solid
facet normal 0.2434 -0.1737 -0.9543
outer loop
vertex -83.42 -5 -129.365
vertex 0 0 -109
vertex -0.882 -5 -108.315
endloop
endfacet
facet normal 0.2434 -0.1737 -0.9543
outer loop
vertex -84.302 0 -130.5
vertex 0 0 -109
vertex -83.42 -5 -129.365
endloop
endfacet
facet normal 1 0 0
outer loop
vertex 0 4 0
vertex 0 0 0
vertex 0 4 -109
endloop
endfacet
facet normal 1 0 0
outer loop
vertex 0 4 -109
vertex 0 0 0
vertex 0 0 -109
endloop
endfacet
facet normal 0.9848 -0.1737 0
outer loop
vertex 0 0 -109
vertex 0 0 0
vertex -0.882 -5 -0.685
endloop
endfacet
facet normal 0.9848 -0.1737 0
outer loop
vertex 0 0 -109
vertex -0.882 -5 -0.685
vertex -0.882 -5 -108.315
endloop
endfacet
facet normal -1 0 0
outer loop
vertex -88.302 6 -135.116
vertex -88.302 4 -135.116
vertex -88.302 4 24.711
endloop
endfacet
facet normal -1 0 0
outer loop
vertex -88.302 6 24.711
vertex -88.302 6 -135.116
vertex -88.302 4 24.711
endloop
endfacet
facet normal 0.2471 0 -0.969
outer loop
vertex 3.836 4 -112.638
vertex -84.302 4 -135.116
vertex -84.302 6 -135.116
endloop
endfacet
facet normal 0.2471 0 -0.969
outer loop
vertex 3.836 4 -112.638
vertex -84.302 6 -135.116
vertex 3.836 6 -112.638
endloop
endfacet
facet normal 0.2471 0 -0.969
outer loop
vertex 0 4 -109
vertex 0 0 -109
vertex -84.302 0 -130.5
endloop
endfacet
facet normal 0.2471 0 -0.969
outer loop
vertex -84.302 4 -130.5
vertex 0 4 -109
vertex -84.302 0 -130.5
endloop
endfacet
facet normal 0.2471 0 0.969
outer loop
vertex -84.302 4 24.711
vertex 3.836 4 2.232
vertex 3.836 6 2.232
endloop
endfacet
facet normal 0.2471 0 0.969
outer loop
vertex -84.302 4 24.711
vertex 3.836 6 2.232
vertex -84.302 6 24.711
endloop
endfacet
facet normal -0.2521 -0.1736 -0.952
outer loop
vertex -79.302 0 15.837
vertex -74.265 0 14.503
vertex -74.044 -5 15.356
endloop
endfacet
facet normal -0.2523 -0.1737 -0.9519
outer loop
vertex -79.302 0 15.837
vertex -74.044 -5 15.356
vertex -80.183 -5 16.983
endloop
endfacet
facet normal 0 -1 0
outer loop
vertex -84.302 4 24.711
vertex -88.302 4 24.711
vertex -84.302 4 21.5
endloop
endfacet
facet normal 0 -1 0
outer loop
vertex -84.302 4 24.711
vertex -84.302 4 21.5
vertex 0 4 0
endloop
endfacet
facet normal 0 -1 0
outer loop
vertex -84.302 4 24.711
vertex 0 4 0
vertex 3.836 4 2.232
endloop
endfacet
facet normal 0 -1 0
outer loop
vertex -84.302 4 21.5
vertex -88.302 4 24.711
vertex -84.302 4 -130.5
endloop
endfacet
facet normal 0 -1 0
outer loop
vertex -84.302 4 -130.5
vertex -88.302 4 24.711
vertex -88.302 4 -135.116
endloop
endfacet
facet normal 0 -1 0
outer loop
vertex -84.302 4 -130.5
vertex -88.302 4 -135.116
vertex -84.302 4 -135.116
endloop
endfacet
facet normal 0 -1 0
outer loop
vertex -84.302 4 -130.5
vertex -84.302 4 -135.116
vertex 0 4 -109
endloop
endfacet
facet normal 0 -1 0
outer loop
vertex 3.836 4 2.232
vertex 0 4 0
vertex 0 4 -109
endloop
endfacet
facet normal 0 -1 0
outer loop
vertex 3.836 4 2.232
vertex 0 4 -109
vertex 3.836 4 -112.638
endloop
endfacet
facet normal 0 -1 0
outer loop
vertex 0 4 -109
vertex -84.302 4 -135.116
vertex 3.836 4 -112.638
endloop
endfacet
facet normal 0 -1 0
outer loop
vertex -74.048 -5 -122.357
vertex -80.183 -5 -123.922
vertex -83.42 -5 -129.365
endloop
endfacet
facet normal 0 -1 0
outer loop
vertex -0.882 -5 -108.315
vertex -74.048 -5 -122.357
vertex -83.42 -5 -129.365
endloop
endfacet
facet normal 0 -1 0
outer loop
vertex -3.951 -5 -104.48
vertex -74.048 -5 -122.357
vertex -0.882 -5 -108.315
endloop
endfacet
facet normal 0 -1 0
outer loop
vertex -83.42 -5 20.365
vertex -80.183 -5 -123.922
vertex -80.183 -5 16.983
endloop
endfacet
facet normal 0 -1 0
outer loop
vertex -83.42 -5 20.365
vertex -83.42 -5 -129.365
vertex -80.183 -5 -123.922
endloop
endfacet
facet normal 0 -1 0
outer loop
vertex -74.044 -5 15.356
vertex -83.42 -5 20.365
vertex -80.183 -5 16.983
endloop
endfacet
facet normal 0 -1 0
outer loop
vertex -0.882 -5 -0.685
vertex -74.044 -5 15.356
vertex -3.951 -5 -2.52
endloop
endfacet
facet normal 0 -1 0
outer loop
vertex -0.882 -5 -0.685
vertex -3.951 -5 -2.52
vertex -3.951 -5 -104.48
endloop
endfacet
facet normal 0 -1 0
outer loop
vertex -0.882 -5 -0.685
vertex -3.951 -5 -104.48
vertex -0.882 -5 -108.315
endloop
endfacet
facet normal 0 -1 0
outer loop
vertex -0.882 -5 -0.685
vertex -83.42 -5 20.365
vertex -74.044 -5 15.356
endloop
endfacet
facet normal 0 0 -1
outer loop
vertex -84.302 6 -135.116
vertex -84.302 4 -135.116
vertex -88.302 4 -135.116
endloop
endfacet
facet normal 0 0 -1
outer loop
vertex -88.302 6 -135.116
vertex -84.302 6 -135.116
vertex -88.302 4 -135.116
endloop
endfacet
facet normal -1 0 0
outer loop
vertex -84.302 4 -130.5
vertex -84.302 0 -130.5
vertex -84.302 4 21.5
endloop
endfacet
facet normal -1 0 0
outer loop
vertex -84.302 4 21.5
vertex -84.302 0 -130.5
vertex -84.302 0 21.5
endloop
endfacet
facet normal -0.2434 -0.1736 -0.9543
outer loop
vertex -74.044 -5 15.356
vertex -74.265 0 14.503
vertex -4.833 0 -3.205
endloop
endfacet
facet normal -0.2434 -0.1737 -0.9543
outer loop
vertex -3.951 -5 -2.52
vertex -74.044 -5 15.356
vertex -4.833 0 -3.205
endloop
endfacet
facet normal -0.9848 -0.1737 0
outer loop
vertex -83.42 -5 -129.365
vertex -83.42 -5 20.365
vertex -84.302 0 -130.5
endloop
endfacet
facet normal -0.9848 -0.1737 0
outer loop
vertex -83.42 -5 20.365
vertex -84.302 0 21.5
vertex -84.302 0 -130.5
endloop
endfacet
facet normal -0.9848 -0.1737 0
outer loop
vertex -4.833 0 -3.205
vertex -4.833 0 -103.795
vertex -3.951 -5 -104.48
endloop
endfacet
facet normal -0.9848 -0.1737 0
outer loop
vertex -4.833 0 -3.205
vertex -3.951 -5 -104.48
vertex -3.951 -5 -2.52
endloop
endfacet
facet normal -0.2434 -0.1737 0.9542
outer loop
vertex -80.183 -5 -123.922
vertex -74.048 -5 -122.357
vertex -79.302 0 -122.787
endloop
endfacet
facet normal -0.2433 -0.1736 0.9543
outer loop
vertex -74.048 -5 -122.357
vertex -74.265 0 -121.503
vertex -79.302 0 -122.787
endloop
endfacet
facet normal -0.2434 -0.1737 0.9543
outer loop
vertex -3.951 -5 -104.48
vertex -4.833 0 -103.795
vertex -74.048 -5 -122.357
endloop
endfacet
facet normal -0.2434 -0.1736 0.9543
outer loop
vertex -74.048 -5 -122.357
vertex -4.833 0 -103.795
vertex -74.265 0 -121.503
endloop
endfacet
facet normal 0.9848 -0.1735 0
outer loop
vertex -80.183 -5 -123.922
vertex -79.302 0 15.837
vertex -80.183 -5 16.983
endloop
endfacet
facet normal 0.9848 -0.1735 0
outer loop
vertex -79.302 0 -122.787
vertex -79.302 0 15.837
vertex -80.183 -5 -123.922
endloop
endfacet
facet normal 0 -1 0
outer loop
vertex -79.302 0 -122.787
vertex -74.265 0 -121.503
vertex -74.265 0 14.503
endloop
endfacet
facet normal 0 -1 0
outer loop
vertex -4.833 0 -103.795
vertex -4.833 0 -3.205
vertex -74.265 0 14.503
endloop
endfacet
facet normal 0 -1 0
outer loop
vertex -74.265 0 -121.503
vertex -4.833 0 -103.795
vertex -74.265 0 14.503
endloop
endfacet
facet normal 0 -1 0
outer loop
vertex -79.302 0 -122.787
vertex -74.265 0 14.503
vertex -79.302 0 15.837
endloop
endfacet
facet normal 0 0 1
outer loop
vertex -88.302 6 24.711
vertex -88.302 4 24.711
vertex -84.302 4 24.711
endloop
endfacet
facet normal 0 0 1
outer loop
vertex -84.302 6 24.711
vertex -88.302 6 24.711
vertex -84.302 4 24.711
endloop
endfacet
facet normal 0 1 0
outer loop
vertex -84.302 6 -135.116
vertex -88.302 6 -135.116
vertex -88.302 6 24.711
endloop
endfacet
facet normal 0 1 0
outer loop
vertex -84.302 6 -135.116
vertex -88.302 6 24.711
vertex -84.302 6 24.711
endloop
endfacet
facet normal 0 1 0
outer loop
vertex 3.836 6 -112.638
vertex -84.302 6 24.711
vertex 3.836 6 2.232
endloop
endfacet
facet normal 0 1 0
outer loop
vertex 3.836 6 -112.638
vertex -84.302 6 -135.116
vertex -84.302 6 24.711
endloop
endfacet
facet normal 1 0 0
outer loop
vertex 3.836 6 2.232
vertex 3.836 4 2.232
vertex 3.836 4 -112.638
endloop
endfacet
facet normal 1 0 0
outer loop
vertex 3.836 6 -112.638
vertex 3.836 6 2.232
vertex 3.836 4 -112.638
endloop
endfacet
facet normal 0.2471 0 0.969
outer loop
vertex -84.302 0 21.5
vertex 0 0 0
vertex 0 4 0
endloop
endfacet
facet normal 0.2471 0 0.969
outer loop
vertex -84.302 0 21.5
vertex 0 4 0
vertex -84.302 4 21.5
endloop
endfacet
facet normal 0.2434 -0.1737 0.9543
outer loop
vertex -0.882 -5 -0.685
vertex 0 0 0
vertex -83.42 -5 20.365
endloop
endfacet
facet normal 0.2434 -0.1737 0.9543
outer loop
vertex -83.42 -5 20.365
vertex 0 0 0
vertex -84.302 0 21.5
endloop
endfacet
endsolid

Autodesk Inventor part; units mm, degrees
ref_plane "YZ Plane" through (0, 0, 0) normal (1, 0, 0) x (0, 1, 0)
ref_plane "XZ Plane" through (0, 0, 0) normal (0, 1, 0) x (-1, 0, 0)
ref_plane "XY Plane" through (0, 0, 0) normal (0, 0, 1) x (1, 0, 0)
sketch "Sketch1" plane through (0, 0, 0) normal (0, 1, 0) x (-1, 0, 0)
  line L0 (0, 0) -> (0, -109)
  line L1 (0, -109) -> (84.3015, -130.5)
  line L2 (84.3015, -130.5) -> (84.3015, 21.5)
  line L3 (0, 0) -> (84.3015, 21.5)
  dimension "d0" = 109
  dimension "d3" = 87
  dimension "d4" = 152
  dimension "d5" = 87
extrude "Extrusion1" add sketch "Sketch1" along normal blind 4
sketch "Sketch2" plane through (0, 0, 0) normal (0, -1, 0) x (1, 0, 0)
  line L0 (0, 0) -> (0, -109) projected
  line L1 (0, -109) -> (-5, -109)
  line L2 (-4.8329, -103.795) -> (-4.8329, -3.205)
  line L3 (-5, 0) -> (0, 0)
  line L4 (0, 0) -> (0, -109)
  line L5 (0, -109) -> (-84.3015, -130.5) projected
  line L6 (-84.3015, -130.5) -> (-74.4446, -130.5)
  line L7 (-79.3015, 21.5) -> (-84.3015, 21.5)
  line L8 (-84.3015, 21.5) -> (-84.3015, -130.5)
  line L9 (-84.3015, -130.5) -> (0, -109)
  line L10 (0, -109) -> (-1.2356, -104.1551)
  line L11 (-85.5402, -125.6434) -> (-84.3015, -130.5)
  line L12 (-84.3015, -130.5) -> (-84.3015, 21.5) projected
  line L13 (0, 0) -> (-84.3015, 21.5)
  line L14 (-84.3015, 21.5) -> (-85.5372, 16.6551)
  line L15 (-1.4353, -5.628) -> (0, 0)
  line L16 (-74.4446, -130.5) -> (-74.4446, -127.9861)
  line L17 (-4.8329, -103.795) -> (-74.2654, -121.5028)
  line L18 (-84.3015, -125.3275) -> (-85.5402, -125.6434)
  line L19 (-85.5372, 16.6551) -> (-84.3015, 16.34)
  line L20 (-74.2654, 14.5028) -> (-4.8329, -3.205)
  line L21 (-79.3015, 20.2248) -> (-79.3015, 21.5)
  line L22 (-79.3015, 15.8371) -> (-79.3015, -122.7872)
  line L23 (-74.2654, -121.5028) -> (-79.3015, -122.7872)
  line L24 (-74.2654, 14.5028) -> (-79.3015, 15.8371)
  dimension "d9" = 5
  dimension "d10" = 5
  dimension "d11" = 5
  dimension "d12" = 5
extrude "Extrusion2" add sketch "Sketch2" along normal blind 5 draft -10 contours L0 L5 L8 L13
sketch "Sketch3" plane through (0, 4, 0) normal (0, 1, 0) x (1, 0, 0)
  line L0 (0, 34.4959) -> (3, 34.4959) construction
  line L1 (3.8363, -2.2322) -> (3.8363, 112.6381)
  line L2 (-79.382, 43.4403) -> (-76.382, 43.4403) construction
  line L3 (-84.3015, 130.5) -> (-84.3015, -21.5) projected
  line L4 (-84.3015, 135.1165) -> (3.8363, 112.6381)
  line L5 (0, 109) -> (-84.3015, 130.5) projected
  line L6 (3.8363, -2.2322) -> (-84.3015, -24.7106)
  line L7 (-84.3015, -21.5) -> (0, 0) projected
  line L8 (-84.3015, 130.5) -> (-84.3015, 135.1165)
  line L9 (-84.3015, -21.5) -> (-84.3015, -24.7106)
  line L10 (-84.3015, 135.1165) -> (-88.3015, 135.1165)
  line L11 (-88.3015, 135.1165) -> (-88.3015, -24.7106)
  line L12 (-88.3015, -24.7106) -> (-84.3015, -24.7106)
  line L13 (-84.3015, -24.7106) -> (-84.3015, 135.1165)
  dimension "d24" = 4
extrude "Extrusion3" add sketch "Sketch3" along normal blind 2
properties part number "FoodHopperLid"
